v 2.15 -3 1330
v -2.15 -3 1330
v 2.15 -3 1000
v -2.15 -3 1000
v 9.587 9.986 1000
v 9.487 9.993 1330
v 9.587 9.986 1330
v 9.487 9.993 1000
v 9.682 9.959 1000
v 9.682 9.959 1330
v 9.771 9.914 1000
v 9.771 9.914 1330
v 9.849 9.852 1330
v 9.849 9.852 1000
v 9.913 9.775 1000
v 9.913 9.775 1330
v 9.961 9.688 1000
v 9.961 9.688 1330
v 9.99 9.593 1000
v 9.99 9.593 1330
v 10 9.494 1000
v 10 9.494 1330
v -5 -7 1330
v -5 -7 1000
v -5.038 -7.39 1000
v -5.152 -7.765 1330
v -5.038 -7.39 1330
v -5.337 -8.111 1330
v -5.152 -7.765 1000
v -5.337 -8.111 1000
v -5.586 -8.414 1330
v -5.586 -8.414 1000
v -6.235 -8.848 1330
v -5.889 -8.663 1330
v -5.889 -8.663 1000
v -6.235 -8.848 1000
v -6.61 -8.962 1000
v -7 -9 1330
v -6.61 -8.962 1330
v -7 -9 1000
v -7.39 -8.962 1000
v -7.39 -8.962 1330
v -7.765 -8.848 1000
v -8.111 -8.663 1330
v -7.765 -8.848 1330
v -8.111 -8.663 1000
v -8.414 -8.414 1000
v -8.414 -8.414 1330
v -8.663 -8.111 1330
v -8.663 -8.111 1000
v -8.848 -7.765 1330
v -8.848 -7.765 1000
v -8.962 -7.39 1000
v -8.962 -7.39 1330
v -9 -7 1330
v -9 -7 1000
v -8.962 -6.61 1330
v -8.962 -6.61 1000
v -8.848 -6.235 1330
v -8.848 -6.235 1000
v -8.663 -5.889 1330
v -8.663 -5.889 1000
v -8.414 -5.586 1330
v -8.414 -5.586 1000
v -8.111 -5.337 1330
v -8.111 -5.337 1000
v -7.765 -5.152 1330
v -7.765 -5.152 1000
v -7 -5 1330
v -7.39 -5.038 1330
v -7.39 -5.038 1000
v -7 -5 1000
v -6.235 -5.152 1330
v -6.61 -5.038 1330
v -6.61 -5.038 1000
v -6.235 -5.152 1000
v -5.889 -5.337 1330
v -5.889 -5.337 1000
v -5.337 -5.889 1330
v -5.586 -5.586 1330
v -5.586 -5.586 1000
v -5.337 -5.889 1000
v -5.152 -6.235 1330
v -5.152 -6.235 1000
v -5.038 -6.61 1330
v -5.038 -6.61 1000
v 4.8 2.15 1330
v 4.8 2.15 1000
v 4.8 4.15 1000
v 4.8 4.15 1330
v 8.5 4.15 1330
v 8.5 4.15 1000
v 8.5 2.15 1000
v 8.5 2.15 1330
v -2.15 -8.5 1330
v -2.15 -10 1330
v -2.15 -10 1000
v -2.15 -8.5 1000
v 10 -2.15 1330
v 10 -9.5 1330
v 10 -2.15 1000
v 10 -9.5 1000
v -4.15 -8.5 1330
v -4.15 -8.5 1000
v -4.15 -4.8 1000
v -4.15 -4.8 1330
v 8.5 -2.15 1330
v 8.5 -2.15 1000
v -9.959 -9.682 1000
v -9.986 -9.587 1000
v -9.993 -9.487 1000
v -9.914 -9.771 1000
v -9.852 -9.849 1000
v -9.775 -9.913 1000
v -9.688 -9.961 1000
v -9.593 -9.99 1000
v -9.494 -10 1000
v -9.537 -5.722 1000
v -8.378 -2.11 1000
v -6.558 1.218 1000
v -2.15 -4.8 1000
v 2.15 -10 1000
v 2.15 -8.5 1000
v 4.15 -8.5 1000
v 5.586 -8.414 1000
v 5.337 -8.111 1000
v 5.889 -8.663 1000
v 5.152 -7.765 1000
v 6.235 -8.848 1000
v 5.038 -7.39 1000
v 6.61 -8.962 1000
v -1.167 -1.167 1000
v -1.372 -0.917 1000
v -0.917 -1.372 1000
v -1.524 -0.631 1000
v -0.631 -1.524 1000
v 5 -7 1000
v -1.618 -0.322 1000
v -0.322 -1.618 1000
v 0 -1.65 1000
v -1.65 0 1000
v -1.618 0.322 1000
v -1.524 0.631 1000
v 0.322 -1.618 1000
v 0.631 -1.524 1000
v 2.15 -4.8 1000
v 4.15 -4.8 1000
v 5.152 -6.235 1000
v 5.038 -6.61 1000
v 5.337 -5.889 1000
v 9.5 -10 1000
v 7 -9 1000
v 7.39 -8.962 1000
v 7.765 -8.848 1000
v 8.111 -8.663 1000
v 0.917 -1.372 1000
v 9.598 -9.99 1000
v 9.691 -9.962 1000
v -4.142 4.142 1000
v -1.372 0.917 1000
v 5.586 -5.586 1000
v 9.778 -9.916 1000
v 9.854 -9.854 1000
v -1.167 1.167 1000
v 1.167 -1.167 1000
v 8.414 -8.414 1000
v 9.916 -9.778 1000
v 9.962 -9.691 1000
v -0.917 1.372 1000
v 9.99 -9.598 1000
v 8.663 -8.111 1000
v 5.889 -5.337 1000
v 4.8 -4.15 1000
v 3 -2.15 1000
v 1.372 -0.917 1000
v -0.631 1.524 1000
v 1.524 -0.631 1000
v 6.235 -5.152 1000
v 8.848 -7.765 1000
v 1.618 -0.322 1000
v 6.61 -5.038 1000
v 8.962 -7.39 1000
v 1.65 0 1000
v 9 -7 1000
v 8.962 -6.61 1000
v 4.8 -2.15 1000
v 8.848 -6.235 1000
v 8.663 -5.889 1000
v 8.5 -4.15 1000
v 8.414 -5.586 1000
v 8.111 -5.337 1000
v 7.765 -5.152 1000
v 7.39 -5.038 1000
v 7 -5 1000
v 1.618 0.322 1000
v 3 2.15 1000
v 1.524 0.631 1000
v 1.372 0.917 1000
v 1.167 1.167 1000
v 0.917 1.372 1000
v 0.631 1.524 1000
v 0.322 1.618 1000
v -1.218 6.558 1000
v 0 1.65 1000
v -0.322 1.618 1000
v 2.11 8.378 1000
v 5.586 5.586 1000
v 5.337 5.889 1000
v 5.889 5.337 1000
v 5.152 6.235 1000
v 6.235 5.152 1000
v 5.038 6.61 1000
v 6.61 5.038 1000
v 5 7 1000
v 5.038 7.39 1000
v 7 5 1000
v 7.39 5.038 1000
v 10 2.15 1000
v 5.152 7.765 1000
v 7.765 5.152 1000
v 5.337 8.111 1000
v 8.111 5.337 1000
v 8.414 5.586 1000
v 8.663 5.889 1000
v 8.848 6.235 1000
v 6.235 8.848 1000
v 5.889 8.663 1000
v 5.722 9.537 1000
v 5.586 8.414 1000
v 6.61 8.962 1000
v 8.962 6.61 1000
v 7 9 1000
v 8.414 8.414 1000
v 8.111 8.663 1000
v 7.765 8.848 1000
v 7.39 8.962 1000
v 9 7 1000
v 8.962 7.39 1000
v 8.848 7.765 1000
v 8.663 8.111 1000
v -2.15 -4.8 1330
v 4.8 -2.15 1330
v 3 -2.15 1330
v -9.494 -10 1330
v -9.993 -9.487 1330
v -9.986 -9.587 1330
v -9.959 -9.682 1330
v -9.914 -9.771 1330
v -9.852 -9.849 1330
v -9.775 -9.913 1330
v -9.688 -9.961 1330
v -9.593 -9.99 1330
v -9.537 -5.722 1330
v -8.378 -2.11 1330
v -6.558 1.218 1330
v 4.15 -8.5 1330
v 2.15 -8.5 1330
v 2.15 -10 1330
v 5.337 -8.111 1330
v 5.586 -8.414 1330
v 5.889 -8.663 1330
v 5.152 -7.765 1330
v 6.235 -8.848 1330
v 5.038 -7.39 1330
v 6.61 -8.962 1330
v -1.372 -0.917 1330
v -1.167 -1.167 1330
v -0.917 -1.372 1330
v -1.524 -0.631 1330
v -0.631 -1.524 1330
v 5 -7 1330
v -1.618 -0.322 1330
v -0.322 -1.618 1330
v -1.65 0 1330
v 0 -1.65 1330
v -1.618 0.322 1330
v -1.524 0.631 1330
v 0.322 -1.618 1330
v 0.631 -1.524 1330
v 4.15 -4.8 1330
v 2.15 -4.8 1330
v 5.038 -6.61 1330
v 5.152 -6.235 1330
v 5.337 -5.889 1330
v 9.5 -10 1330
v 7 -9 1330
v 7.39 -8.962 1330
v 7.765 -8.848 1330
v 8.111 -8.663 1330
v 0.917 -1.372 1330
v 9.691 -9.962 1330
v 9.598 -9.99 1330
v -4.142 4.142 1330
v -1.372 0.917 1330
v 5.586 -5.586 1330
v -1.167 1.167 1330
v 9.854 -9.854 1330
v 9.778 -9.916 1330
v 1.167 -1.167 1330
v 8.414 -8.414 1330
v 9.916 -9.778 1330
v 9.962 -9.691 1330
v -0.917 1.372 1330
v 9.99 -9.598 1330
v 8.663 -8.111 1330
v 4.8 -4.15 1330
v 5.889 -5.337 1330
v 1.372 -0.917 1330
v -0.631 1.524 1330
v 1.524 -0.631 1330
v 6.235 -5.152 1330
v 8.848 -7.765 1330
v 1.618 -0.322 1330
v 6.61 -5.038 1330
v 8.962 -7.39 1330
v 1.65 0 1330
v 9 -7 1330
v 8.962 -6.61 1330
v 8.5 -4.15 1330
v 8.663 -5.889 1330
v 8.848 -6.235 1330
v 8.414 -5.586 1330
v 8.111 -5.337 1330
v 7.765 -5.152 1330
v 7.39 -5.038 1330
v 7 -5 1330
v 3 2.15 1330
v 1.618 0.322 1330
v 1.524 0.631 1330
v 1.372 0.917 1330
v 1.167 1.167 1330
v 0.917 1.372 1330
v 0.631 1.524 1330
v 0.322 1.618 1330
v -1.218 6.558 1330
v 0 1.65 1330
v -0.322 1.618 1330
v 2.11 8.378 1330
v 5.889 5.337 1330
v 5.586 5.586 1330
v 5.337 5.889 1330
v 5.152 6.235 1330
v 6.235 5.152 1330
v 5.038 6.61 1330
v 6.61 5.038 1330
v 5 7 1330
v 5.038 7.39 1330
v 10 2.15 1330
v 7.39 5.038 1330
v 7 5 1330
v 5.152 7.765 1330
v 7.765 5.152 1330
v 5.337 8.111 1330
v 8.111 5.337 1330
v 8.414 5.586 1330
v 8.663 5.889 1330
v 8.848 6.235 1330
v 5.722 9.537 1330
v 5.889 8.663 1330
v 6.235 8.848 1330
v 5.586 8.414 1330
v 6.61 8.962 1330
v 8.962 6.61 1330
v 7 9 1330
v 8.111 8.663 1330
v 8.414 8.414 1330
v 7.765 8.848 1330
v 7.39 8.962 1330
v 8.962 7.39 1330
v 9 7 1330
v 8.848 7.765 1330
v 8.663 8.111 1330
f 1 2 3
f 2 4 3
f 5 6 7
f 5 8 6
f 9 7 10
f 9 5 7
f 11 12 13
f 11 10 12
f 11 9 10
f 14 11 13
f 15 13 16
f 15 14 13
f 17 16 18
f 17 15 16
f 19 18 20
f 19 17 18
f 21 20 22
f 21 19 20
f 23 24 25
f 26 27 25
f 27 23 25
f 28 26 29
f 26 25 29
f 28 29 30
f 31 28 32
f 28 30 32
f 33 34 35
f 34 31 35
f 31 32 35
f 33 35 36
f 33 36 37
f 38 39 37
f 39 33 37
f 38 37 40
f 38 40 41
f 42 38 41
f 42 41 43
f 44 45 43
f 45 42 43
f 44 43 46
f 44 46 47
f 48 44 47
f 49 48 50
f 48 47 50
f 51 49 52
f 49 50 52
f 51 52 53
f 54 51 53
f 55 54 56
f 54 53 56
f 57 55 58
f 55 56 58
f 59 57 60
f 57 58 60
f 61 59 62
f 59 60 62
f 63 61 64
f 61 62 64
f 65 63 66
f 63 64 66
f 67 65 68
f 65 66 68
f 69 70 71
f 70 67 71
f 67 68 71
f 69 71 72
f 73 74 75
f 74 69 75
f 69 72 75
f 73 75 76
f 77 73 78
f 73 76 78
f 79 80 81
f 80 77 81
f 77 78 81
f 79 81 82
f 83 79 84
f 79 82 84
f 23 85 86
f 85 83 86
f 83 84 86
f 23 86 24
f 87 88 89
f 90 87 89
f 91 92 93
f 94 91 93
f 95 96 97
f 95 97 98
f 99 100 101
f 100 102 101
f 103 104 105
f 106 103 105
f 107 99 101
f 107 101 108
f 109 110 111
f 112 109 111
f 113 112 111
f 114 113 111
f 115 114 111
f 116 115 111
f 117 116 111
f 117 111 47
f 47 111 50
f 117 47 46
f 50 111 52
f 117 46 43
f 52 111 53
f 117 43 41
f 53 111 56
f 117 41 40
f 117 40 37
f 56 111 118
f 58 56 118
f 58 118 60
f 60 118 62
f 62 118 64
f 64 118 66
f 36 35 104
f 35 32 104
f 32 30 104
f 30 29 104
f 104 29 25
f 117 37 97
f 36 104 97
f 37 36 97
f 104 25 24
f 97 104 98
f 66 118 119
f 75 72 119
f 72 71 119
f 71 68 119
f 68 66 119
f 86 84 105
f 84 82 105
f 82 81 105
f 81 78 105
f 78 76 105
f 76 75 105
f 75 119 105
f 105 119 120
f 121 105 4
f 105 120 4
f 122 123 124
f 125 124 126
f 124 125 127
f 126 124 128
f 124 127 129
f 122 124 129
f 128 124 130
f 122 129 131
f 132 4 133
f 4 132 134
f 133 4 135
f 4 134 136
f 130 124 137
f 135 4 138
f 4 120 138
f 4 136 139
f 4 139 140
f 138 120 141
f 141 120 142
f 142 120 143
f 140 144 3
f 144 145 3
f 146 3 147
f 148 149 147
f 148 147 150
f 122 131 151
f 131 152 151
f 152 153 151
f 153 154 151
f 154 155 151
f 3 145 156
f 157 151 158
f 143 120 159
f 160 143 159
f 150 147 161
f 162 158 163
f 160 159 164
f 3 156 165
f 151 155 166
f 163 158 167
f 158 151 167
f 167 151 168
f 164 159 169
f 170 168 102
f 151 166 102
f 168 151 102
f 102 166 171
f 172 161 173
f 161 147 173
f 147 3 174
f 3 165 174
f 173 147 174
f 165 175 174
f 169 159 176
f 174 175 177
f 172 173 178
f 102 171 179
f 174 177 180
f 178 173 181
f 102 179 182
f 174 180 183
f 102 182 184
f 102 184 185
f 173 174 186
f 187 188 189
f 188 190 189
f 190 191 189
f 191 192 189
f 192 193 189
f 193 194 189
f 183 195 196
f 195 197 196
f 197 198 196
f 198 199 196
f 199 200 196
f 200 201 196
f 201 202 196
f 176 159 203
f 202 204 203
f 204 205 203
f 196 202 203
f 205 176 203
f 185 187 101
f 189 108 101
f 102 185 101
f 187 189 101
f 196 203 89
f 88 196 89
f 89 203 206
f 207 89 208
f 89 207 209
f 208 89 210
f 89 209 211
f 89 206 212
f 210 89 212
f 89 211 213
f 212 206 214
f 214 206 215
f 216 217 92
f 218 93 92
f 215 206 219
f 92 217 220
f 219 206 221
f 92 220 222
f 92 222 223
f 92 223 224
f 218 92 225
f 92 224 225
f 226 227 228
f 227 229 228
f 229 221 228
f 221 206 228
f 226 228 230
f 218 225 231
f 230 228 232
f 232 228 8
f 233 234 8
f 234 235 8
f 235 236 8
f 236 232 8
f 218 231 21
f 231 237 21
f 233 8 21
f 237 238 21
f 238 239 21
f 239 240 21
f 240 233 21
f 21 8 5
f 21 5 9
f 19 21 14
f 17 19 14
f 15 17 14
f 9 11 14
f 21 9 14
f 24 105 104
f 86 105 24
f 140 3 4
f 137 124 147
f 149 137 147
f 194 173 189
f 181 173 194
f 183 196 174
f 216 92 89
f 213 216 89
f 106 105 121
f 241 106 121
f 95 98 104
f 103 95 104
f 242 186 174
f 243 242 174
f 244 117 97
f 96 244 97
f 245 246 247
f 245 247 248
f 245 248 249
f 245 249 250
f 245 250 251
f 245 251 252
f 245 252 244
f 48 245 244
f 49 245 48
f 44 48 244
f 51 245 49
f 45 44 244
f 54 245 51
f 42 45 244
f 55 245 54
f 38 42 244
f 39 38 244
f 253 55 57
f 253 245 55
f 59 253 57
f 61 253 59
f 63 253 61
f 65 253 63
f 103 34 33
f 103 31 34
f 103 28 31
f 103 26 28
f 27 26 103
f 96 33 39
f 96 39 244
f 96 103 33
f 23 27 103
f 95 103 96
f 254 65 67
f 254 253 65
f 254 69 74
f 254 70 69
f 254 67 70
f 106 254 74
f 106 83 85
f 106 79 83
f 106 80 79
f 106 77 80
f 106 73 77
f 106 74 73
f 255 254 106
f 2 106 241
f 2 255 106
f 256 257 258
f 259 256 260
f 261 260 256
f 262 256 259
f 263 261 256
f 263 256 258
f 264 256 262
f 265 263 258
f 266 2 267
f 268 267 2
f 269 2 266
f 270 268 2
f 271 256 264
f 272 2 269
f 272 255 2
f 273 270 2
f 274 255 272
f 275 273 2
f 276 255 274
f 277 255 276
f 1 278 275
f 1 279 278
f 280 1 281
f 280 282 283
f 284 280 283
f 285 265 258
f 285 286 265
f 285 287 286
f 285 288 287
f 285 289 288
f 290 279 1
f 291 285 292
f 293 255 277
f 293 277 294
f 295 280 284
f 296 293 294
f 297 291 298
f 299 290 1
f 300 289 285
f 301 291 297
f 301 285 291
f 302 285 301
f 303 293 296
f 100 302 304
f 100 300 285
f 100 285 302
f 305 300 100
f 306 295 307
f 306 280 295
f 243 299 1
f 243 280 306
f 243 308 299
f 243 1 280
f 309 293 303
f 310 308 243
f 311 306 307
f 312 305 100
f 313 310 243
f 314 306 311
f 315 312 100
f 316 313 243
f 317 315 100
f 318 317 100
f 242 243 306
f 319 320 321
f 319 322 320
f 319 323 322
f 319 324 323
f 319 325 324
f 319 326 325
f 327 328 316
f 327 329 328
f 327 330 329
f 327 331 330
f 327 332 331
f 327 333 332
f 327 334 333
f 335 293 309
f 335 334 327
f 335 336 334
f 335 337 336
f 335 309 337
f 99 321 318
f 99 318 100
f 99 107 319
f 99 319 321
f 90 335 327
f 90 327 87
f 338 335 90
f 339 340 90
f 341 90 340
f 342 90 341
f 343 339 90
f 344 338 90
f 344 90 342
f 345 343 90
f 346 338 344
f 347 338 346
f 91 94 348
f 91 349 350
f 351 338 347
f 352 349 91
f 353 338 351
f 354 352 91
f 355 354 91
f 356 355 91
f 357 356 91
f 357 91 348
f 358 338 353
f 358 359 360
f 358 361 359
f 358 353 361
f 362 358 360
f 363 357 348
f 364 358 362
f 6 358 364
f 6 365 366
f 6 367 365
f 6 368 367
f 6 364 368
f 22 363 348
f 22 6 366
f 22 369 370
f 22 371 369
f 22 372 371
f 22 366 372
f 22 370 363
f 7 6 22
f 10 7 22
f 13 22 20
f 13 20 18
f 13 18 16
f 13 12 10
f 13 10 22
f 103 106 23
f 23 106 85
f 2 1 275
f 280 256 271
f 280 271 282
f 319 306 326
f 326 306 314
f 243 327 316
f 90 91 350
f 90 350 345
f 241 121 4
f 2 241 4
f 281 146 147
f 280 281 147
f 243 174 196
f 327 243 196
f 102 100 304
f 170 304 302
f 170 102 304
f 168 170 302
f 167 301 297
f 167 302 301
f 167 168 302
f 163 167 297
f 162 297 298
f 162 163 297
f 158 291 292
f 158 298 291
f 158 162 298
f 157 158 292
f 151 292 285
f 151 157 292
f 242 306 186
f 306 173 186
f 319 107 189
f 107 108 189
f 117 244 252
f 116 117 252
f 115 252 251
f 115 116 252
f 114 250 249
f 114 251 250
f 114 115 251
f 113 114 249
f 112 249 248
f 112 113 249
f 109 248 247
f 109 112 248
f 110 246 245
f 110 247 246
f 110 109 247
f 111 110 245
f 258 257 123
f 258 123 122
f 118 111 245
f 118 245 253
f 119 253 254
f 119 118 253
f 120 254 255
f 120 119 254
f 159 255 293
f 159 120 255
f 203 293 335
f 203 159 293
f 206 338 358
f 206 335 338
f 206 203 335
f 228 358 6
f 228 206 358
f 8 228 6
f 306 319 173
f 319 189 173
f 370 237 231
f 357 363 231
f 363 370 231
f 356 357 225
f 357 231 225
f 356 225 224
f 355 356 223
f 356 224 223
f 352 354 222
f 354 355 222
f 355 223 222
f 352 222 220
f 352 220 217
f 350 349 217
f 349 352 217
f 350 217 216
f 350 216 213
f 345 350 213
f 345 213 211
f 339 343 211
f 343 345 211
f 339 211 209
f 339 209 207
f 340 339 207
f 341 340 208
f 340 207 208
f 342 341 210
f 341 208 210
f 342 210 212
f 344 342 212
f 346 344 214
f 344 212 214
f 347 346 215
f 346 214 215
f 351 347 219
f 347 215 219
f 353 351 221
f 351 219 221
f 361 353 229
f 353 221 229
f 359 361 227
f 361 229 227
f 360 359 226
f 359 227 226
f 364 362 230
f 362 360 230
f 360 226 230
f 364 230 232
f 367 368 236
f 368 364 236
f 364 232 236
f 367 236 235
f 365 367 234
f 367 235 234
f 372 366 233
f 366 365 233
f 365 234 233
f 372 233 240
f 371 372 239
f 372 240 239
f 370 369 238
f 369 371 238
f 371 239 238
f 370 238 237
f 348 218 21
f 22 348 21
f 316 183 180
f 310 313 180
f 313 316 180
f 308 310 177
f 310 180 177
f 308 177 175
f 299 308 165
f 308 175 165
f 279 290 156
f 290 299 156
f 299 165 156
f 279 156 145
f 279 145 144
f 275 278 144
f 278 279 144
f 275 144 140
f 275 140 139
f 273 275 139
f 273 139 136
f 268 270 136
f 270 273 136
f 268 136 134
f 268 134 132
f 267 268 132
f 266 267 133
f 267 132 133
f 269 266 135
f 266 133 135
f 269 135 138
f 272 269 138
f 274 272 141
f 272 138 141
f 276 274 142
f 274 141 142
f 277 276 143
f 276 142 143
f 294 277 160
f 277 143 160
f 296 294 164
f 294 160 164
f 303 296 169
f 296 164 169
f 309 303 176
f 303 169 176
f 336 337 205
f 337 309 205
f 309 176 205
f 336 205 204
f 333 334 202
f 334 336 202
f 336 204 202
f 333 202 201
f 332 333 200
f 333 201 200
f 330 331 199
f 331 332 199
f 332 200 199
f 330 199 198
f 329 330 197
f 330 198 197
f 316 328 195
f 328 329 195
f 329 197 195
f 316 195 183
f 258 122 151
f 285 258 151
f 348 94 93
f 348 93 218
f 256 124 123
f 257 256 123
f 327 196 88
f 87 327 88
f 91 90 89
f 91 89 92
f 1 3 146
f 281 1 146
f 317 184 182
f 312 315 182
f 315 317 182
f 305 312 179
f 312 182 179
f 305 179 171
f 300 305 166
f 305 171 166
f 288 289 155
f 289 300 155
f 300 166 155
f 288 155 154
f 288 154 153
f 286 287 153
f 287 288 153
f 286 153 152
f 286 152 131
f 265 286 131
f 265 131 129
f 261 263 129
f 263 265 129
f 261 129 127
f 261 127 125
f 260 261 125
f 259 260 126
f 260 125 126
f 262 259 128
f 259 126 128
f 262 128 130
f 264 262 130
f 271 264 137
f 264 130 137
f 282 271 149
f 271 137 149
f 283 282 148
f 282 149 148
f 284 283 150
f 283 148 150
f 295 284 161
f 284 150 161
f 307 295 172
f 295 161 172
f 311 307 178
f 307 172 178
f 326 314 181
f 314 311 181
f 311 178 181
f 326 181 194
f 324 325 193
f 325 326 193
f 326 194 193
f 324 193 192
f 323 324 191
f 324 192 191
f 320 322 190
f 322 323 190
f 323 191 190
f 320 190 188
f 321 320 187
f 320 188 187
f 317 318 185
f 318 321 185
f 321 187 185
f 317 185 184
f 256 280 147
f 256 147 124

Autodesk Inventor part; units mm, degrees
ref_plane "YZ Plane" through (0, 0, 0) normal (1, 0, 0) x (0, 1, 0)
ref_plane "XZ Plane" through (0, 0, 0) normal (0, 1, 0) x (-1, 0, 0)
ref_plane "作業平面1" through (2.15, -10, 1000) normal (0, 0, 1) x (1, 0, 0)
sketch "スケッチ1" plane through (2.15, -10, 1000) normal (0, 0, 1) x (1, 0, 0)
  line L0 (6.35, 12.15) -> (7.85, 12.15) projected
  line L1 (7.85, 12.15) -> (7.85, 19.4936) projected
  arc A0 (7.85, 19.4936) -> (7.3372, 19.9934) centre (7.35, 19.4936) ccw projected
  arc A1 (7.3372, 19.9934) -> (-12.1434, 0.5128) centre (7.85, 0) ccw projected
  arc A2 (-12.1434, 0.5128) -> (-11.6436, 0) centre (-11.6436, 0.5) ccw projected
  line L2 (-11.6436, 0) -> (-4.3, 0) projected
  line L3 (-4.3, 0) -> (-4.3, 1.5) projected
  line L4 (-4.3, 1.5) -> (-6.3, 1.5) projected
  line L5 (-6.3, 1.5) -> (-6.3, 5.2) projected
  line L6 (-6.3, 5.2) -> (-4.3, 5.2) projected
  line L7 (-4.3, 5.2) -> (-4.3, 7) projected
  line L8 (-4.3, 7) -> (0, 7) projected
  line L9 (0, 7) -> (0, 5.2) projected
  line L10 (0, 5.2) -> (2, 5.2) projected
  line L11 (2, 5.2) -> (2, 1.5) projected
  line L12 (2, 1.5) -> (0, 1.5) projected
  line L13 (0, 1.5) -> (0, 0) projected
  line L14 (0, 0) -> (7.35, 0) projected
  arc A3 (7.35, 0) -> (7.85, 0.5) centre (7.35, 0.5) ccw projected
  line L15 (7.85, 0.5) -> (7.85, 7.85) projected
  line L16 (7.85, 7.85) -> (6.35, 7.85) projected
  line L17 (6.35, 7.85) -> (6.35, 5.85) projected
  line L18 (6.35, 5.85) -> (2.65, 5.85) projected
  line L19 (2.65, 5.85) -> (2.65, 7.85) projected
  line L20 (2.65, 7.85) -> (0.85, 7.85) projected
  line L21 (0.85, 7.85) -> (0.85, 12.15) projected
  line L22 (0.85, 12.15) -> (2.65, 12.15) projected
  line L23 (2.65, 12.15) -> (2.65, 14.15) projected
  line L24 (2.65, 14.15) -> (6.35, 14.15) projected
  line L25 (6.35, 14.15) -> (6.35, 12.15) projected
  circle A4 centre (4.85, 3) radius 2 projected
  circle A5 centre (-9.15, 3) radius 2 projected
  circle A6 centre (4.85, 17) radius 2 projected
  circle A7 centre (-2.15, 10) radius 1.65 projected
extrude "押し出し1" add sketch "スケッチ1" along normal blind 330
properties part number "AFSR-2020-4-1000"
